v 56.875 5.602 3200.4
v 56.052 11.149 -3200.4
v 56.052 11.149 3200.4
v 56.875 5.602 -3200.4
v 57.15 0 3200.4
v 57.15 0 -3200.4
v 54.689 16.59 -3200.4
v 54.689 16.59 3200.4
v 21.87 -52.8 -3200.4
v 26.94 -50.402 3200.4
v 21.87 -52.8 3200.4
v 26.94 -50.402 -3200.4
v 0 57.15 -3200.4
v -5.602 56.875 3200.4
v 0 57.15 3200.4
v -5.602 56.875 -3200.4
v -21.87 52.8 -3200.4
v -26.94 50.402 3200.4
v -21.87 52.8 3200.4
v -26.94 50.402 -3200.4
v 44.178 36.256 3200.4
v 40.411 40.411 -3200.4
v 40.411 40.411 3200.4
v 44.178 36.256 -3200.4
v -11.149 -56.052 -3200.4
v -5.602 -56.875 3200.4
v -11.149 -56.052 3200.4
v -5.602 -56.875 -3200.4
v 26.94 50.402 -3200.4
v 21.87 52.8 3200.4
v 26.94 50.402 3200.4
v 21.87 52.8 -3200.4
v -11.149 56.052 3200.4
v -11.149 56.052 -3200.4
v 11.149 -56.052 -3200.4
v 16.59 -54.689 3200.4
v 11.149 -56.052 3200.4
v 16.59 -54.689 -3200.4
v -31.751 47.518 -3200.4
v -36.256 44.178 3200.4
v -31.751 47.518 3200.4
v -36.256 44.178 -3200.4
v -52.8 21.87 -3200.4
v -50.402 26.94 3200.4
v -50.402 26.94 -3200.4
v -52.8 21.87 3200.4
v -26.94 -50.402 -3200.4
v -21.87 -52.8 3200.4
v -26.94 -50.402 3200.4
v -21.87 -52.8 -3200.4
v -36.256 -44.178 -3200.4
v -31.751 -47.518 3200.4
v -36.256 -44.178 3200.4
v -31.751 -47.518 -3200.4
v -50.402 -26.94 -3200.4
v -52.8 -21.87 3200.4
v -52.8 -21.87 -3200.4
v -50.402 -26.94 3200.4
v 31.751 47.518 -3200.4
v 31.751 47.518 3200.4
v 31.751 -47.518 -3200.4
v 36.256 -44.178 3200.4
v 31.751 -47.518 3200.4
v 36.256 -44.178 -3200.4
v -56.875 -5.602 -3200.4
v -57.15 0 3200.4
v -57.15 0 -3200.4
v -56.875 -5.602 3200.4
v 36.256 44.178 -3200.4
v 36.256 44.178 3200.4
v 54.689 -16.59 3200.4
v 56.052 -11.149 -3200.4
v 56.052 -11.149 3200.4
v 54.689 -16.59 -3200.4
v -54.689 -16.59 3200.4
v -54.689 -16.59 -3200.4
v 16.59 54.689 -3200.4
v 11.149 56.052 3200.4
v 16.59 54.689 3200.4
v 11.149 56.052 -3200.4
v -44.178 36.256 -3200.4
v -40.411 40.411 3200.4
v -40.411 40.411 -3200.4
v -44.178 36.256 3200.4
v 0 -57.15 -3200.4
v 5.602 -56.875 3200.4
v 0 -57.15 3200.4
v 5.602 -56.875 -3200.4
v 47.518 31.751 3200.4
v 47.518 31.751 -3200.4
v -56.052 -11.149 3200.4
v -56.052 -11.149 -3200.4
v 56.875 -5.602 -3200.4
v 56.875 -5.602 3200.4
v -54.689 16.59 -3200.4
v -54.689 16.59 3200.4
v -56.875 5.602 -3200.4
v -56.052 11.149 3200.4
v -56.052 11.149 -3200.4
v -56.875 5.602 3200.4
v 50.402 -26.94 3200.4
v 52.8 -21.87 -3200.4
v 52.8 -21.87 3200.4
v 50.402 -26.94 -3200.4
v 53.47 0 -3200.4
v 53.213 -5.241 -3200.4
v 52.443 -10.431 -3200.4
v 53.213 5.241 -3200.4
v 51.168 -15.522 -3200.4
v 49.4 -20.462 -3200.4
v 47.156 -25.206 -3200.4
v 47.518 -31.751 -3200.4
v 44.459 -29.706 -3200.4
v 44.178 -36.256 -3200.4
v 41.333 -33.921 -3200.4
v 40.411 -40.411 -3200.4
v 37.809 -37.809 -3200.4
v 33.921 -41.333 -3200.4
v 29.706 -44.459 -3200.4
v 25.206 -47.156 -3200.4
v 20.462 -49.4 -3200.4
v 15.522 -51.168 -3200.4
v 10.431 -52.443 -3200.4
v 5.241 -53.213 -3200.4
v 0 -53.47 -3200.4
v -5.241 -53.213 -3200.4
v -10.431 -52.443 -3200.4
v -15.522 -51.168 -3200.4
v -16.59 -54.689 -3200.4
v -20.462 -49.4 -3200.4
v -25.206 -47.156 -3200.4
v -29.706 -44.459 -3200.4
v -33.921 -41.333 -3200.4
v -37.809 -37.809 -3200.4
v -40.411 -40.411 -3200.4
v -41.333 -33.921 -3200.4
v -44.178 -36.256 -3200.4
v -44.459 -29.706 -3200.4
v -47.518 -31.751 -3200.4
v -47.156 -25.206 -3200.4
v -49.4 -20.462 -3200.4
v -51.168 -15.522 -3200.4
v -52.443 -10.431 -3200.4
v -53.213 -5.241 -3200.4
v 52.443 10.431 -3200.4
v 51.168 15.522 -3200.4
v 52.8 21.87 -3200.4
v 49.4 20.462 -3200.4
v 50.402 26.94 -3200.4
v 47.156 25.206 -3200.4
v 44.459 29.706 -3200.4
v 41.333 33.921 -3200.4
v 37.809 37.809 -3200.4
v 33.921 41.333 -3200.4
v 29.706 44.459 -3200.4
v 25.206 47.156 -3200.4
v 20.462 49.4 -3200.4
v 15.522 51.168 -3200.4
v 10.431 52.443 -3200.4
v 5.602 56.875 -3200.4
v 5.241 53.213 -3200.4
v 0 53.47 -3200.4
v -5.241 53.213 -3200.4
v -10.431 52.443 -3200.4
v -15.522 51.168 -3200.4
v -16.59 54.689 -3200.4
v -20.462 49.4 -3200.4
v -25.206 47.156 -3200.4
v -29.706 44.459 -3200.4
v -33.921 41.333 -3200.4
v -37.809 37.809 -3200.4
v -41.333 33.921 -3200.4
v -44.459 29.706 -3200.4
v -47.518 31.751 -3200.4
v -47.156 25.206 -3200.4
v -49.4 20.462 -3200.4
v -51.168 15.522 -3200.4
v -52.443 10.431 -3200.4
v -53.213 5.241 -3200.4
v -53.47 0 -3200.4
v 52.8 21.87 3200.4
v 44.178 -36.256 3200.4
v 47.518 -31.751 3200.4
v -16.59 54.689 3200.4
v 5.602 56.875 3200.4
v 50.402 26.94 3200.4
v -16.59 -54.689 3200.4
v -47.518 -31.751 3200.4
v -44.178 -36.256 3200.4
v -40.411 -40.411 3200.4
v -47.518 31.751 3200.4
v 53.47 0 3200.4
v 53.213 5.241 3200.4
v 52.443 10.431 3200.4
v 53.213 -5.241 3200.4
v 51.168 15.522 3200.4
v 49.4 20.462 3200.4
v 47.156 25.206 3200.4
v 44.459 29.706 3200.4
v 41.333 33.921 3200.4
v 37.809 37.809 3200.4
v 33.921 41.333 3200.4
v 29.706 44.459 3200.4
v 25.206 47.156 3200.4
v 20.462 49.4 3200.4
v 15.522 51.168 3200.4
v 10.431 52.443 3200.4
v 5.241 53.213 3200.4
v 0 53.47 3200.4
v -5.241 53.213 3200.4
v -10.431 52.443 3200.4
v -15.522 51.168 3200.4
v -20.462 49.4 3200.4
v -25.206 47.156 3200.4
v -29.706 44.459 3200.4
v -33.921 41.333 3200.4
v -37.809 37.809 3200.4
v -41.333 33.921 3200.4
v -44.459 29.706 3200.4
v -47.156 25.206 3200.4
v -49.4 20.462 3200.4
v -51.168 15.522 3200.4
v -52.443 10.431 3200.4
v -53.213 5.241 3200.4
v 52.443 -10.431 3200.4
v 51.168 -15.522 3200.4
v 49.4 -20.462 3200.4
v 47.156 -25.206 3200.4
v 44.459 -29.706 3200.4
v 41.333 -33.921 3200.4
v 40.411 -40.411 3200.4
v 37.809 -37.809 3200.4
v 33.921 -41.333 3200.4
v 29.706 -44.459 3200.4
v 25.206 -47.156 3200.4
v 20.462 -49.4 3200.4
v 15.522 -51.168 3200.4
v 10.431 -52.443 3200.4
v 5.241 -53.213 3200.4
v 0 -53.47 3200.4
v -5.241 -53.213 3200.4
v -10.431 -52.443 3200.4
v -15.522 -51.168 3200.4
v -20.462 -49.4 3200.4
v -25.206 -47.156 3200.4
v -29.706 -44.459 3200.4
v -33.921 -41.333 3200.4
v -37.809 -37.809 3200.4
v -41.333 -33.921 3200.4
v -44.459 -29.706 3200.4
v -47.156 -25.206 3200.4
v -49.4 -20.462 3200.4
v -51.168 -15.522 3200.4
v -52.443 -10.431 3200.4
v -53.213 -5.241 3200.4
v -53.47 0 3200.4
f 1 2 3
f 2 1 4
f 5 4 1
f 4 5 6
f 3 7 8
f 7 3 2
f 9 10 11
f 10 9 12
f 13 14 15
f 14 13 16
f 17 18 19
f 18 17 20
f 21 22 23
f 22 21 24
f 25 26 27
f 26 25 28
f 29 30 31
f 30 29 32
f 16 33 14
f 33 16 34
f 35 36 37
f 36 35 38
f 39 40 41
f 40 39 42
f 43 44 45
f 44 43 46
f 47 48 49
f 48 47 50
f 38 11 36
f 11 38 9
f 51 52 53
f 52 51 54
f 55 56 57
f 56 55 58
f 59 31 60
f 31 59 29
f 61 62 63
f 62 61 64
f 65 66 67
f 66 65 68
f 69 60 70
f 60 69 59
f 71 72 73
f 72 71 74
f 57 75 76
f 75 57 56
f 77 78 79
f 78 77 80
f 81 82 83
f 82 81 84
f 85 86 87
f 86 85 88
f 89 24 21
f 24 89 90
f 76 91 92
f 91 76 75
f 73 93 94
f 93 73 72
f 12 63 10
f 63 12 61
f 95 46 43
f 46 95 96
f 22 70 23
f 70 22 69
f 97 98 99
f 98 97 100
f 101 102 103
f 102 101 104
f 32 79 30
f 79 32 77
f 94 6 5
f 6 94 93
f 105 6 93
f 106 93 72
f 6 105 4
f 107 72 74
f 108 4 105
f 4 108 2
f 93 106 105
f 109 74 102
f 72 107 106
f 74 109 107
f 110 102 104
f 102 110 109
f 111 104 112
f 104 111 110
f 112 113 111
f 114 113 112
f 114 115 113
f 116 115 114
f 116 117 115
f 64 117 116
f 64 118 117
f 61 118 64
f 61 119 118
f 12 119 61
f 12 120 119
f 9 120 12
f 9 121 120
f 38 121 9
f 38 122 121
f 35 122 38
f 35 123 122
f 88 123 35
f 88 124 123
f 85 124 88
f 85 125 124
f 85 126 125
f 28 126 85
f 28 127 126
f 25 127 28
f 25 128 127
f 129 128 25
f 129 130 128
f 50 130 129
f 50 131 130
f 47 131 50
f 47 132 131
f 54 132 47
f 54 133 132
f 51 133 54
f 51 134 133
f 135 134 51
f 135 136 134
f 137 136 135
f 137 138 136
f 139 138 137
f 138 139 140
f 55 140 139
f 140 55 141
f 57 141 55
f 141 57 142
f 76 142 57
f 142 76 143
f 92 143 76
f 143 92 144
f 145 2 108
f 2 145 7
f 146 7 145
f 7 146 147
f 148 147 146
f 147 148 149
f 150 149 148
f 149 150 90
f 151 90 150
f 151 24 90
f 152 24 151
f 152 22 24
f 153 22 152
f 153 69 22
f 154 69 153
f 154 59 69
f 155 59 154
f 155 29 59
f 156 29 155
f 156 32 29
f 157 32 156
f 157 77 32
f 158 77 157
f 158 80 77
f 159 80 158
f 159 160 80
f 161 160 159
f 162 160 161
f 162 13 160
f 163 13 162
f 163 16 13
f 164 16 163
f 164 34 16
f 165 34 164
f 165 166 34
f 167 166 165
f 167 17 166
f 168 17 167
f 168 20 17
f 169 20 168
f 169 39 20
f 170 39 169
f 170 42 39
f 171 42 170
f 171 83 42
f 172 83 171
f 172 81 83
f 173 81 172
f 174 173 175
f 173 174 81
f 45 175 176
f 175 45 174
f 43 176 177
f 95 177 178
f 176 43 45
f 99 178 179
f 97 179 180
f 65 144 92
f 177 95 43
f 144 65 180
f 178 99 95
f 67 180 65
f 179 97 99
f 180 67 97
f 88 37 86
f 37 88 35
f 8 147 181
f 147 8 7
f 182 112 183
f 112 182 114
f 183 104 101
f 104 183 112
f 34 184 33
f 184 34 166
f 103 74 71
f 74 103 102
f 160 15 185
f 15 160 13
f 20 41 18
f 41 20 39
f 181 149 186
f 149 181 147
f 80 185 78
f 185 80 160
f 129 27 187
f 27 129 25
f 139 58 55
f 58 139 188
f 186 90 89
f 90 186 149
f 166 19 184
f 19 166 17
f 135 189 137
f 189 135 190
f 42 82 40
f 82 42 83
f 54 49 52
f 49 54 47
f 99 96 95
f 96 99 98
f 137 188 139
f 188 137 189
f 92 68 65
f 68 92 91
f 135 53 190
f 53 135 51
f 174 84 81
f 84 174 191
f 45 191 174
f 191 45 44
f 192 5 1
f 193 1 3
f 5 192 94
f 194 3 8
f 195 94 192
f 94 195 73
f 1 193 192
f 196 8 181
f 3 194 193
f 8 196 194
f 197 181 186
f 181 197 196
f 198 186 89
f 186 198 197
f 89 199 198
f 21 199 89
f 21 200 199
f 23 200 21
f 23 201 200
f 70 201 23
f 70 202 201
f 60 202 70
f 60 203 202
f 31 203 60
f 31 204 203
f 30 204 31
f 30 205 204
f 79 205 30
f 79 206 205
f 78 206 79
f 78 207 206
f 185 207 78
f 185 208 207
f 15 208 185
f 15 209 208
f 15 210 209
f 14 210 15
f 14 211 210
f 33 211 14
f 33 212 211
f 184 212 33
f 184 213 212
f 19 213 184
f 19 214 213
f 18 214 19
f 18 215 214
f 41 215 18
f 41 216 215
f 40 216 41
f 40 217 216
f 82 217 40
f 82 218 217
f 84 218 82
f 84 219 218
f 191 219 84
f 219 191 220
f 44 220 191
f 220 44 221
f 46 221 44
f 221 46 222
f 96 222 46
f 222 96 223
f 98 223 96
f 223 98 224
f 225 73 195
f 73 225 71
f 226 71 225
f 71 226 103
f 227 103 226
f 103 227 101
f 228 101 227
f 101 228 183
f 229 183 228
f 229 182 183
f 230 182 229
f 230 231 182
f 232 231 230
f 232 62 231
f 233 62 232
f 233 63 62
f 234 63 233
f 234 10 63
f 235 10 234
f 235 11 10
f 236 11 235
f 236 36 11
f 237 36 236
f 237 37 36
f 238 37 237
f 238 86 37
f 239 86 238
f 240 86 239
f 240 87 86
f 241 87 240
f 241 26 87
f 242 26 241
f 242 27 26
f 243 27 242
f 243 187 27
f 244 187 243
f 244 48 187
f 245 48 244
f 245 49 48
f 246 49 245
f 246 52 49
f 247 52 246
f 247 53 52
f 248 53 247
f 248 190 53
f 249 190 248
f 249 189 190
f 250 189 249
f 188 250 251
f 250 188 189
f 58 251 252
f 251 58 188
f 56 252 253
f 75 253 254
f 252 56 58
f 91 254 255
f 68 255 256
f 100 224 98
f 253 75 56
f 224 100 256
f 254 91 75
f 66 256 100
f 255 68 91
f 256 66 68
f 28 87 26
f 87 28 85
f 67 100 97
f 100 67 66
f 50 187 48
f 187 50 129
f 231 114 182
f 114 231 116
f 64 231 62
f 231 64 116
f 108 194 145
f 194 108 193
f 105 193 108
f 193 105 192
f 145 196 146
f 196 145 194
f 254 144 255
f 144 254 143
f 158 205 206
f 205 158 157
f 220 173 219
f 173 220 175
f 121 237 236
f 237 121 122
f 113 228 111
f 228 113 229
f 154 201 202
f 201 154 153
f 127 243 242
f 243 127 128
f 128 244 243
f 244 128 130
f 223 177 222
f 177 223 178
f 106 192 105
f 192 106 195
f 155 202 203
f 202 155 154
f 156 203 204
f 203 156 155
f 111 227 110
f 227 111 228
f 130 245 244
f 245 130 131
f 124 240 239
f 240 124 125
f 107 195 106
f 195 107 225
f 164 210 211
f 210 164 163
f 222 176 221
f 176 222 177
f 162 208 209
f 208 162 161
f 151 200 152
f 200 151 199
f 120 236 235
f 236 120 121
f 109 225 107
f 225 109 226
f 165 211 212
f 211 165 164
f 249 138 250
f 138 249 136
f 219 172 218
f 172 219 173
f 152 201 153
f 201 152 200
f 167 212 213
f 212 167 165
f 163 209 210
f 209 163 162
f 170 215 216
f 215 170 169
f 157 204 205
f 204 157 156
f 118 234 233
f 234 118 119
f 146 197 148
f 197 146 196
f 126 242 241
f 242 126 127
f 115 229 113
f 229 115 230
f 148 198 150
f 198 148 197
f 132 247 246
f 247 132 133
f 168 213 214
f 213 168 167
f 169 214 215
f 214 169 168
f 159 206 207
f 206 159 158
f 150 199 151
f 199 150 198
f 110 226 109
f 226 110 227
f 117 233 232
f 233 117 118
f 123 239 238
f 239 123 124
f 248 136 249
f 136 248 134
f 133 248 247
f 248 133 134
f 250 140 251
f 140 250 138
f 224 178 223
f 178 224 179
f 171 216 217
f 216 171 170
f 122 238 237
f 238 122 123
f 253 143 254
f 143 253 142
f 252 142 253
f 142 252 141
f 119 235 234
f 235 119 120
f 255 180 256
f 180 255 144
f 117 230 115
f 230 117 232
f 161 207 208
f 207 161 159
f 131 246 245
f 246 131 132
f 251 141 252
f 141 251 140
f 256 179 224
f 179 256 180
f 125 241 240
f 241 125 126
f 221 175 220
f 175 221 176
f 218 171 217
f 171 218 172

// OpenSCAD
// Auto-generated by scripts/author_from_manifest.py (Phase D.3).
// Source: data/phase_d_manifest.json (sku_intent='wheatland-sch40-black-4in-21ft').
// Do not hand-edit — regenerate from the manifest.
//
// @part wheatland_sch40_black_4in_21ft
// @kind pipe_segment
// @category pipe.sch40.black.steel
// @display-name "Sch40 Black Steel 4\" x 21ft"
// @mfg wheatland_tube
// @price-usd 58.00
// @install-minutes 8
// @crew journeyman
// @param size_in number default=4 label="Size" unit="in"
// @port inlet position=[0,0,-0.5] direction=[0,0,-1] style=grooved size_in=4 role=run_a
// @port outlet position=[0,0,0.5] direction=[0,0,1] style=grooved size_in=4 role=run_b

size_in  = 4.0;
length_m = 6.4008;
schedule = "sch10";

function od_mm(nps) =
    nps ==  0.75 ? 26.7 :
    nps ==   1  ? 33.4 :
    nps == 1.25 ? 42.2 :
    nps == 1.5  ? 48.3 :
    nps ==   2  ? 60.3 :
    nps == 2.5  ? 73.0 :
    nps ==   3  ? 88.9 :
    nps ==   4  ? 114.3 :
    nps ==   5  ? 141.3 :
    nps ==   6  ? 168.3 :
    nps ==   8  ? 219.1 :
    nps ==  10  ? 273.0 : 60.3;

function wall_mm(nps, sched) =
    sched == "sch40"
        ? (nps <= 1.5 ? 3.68 : nps <= 3 ? 5.49 : 6.02)
        : (nps <= 1.5 ? 2.77 : nps <= 3 ? 3.05 : 3.68);

od = od_mm(size_in);
id = od - 2 * wall_mm(size_in, schedule);
len_mm = length_m * 1000;

difference() {
    cylinder(h = len_mm, d = od, center = true, $fn = 64);
    cylinder(h = len_mm + 1, d = id, center = true, $fn = 64);
}
